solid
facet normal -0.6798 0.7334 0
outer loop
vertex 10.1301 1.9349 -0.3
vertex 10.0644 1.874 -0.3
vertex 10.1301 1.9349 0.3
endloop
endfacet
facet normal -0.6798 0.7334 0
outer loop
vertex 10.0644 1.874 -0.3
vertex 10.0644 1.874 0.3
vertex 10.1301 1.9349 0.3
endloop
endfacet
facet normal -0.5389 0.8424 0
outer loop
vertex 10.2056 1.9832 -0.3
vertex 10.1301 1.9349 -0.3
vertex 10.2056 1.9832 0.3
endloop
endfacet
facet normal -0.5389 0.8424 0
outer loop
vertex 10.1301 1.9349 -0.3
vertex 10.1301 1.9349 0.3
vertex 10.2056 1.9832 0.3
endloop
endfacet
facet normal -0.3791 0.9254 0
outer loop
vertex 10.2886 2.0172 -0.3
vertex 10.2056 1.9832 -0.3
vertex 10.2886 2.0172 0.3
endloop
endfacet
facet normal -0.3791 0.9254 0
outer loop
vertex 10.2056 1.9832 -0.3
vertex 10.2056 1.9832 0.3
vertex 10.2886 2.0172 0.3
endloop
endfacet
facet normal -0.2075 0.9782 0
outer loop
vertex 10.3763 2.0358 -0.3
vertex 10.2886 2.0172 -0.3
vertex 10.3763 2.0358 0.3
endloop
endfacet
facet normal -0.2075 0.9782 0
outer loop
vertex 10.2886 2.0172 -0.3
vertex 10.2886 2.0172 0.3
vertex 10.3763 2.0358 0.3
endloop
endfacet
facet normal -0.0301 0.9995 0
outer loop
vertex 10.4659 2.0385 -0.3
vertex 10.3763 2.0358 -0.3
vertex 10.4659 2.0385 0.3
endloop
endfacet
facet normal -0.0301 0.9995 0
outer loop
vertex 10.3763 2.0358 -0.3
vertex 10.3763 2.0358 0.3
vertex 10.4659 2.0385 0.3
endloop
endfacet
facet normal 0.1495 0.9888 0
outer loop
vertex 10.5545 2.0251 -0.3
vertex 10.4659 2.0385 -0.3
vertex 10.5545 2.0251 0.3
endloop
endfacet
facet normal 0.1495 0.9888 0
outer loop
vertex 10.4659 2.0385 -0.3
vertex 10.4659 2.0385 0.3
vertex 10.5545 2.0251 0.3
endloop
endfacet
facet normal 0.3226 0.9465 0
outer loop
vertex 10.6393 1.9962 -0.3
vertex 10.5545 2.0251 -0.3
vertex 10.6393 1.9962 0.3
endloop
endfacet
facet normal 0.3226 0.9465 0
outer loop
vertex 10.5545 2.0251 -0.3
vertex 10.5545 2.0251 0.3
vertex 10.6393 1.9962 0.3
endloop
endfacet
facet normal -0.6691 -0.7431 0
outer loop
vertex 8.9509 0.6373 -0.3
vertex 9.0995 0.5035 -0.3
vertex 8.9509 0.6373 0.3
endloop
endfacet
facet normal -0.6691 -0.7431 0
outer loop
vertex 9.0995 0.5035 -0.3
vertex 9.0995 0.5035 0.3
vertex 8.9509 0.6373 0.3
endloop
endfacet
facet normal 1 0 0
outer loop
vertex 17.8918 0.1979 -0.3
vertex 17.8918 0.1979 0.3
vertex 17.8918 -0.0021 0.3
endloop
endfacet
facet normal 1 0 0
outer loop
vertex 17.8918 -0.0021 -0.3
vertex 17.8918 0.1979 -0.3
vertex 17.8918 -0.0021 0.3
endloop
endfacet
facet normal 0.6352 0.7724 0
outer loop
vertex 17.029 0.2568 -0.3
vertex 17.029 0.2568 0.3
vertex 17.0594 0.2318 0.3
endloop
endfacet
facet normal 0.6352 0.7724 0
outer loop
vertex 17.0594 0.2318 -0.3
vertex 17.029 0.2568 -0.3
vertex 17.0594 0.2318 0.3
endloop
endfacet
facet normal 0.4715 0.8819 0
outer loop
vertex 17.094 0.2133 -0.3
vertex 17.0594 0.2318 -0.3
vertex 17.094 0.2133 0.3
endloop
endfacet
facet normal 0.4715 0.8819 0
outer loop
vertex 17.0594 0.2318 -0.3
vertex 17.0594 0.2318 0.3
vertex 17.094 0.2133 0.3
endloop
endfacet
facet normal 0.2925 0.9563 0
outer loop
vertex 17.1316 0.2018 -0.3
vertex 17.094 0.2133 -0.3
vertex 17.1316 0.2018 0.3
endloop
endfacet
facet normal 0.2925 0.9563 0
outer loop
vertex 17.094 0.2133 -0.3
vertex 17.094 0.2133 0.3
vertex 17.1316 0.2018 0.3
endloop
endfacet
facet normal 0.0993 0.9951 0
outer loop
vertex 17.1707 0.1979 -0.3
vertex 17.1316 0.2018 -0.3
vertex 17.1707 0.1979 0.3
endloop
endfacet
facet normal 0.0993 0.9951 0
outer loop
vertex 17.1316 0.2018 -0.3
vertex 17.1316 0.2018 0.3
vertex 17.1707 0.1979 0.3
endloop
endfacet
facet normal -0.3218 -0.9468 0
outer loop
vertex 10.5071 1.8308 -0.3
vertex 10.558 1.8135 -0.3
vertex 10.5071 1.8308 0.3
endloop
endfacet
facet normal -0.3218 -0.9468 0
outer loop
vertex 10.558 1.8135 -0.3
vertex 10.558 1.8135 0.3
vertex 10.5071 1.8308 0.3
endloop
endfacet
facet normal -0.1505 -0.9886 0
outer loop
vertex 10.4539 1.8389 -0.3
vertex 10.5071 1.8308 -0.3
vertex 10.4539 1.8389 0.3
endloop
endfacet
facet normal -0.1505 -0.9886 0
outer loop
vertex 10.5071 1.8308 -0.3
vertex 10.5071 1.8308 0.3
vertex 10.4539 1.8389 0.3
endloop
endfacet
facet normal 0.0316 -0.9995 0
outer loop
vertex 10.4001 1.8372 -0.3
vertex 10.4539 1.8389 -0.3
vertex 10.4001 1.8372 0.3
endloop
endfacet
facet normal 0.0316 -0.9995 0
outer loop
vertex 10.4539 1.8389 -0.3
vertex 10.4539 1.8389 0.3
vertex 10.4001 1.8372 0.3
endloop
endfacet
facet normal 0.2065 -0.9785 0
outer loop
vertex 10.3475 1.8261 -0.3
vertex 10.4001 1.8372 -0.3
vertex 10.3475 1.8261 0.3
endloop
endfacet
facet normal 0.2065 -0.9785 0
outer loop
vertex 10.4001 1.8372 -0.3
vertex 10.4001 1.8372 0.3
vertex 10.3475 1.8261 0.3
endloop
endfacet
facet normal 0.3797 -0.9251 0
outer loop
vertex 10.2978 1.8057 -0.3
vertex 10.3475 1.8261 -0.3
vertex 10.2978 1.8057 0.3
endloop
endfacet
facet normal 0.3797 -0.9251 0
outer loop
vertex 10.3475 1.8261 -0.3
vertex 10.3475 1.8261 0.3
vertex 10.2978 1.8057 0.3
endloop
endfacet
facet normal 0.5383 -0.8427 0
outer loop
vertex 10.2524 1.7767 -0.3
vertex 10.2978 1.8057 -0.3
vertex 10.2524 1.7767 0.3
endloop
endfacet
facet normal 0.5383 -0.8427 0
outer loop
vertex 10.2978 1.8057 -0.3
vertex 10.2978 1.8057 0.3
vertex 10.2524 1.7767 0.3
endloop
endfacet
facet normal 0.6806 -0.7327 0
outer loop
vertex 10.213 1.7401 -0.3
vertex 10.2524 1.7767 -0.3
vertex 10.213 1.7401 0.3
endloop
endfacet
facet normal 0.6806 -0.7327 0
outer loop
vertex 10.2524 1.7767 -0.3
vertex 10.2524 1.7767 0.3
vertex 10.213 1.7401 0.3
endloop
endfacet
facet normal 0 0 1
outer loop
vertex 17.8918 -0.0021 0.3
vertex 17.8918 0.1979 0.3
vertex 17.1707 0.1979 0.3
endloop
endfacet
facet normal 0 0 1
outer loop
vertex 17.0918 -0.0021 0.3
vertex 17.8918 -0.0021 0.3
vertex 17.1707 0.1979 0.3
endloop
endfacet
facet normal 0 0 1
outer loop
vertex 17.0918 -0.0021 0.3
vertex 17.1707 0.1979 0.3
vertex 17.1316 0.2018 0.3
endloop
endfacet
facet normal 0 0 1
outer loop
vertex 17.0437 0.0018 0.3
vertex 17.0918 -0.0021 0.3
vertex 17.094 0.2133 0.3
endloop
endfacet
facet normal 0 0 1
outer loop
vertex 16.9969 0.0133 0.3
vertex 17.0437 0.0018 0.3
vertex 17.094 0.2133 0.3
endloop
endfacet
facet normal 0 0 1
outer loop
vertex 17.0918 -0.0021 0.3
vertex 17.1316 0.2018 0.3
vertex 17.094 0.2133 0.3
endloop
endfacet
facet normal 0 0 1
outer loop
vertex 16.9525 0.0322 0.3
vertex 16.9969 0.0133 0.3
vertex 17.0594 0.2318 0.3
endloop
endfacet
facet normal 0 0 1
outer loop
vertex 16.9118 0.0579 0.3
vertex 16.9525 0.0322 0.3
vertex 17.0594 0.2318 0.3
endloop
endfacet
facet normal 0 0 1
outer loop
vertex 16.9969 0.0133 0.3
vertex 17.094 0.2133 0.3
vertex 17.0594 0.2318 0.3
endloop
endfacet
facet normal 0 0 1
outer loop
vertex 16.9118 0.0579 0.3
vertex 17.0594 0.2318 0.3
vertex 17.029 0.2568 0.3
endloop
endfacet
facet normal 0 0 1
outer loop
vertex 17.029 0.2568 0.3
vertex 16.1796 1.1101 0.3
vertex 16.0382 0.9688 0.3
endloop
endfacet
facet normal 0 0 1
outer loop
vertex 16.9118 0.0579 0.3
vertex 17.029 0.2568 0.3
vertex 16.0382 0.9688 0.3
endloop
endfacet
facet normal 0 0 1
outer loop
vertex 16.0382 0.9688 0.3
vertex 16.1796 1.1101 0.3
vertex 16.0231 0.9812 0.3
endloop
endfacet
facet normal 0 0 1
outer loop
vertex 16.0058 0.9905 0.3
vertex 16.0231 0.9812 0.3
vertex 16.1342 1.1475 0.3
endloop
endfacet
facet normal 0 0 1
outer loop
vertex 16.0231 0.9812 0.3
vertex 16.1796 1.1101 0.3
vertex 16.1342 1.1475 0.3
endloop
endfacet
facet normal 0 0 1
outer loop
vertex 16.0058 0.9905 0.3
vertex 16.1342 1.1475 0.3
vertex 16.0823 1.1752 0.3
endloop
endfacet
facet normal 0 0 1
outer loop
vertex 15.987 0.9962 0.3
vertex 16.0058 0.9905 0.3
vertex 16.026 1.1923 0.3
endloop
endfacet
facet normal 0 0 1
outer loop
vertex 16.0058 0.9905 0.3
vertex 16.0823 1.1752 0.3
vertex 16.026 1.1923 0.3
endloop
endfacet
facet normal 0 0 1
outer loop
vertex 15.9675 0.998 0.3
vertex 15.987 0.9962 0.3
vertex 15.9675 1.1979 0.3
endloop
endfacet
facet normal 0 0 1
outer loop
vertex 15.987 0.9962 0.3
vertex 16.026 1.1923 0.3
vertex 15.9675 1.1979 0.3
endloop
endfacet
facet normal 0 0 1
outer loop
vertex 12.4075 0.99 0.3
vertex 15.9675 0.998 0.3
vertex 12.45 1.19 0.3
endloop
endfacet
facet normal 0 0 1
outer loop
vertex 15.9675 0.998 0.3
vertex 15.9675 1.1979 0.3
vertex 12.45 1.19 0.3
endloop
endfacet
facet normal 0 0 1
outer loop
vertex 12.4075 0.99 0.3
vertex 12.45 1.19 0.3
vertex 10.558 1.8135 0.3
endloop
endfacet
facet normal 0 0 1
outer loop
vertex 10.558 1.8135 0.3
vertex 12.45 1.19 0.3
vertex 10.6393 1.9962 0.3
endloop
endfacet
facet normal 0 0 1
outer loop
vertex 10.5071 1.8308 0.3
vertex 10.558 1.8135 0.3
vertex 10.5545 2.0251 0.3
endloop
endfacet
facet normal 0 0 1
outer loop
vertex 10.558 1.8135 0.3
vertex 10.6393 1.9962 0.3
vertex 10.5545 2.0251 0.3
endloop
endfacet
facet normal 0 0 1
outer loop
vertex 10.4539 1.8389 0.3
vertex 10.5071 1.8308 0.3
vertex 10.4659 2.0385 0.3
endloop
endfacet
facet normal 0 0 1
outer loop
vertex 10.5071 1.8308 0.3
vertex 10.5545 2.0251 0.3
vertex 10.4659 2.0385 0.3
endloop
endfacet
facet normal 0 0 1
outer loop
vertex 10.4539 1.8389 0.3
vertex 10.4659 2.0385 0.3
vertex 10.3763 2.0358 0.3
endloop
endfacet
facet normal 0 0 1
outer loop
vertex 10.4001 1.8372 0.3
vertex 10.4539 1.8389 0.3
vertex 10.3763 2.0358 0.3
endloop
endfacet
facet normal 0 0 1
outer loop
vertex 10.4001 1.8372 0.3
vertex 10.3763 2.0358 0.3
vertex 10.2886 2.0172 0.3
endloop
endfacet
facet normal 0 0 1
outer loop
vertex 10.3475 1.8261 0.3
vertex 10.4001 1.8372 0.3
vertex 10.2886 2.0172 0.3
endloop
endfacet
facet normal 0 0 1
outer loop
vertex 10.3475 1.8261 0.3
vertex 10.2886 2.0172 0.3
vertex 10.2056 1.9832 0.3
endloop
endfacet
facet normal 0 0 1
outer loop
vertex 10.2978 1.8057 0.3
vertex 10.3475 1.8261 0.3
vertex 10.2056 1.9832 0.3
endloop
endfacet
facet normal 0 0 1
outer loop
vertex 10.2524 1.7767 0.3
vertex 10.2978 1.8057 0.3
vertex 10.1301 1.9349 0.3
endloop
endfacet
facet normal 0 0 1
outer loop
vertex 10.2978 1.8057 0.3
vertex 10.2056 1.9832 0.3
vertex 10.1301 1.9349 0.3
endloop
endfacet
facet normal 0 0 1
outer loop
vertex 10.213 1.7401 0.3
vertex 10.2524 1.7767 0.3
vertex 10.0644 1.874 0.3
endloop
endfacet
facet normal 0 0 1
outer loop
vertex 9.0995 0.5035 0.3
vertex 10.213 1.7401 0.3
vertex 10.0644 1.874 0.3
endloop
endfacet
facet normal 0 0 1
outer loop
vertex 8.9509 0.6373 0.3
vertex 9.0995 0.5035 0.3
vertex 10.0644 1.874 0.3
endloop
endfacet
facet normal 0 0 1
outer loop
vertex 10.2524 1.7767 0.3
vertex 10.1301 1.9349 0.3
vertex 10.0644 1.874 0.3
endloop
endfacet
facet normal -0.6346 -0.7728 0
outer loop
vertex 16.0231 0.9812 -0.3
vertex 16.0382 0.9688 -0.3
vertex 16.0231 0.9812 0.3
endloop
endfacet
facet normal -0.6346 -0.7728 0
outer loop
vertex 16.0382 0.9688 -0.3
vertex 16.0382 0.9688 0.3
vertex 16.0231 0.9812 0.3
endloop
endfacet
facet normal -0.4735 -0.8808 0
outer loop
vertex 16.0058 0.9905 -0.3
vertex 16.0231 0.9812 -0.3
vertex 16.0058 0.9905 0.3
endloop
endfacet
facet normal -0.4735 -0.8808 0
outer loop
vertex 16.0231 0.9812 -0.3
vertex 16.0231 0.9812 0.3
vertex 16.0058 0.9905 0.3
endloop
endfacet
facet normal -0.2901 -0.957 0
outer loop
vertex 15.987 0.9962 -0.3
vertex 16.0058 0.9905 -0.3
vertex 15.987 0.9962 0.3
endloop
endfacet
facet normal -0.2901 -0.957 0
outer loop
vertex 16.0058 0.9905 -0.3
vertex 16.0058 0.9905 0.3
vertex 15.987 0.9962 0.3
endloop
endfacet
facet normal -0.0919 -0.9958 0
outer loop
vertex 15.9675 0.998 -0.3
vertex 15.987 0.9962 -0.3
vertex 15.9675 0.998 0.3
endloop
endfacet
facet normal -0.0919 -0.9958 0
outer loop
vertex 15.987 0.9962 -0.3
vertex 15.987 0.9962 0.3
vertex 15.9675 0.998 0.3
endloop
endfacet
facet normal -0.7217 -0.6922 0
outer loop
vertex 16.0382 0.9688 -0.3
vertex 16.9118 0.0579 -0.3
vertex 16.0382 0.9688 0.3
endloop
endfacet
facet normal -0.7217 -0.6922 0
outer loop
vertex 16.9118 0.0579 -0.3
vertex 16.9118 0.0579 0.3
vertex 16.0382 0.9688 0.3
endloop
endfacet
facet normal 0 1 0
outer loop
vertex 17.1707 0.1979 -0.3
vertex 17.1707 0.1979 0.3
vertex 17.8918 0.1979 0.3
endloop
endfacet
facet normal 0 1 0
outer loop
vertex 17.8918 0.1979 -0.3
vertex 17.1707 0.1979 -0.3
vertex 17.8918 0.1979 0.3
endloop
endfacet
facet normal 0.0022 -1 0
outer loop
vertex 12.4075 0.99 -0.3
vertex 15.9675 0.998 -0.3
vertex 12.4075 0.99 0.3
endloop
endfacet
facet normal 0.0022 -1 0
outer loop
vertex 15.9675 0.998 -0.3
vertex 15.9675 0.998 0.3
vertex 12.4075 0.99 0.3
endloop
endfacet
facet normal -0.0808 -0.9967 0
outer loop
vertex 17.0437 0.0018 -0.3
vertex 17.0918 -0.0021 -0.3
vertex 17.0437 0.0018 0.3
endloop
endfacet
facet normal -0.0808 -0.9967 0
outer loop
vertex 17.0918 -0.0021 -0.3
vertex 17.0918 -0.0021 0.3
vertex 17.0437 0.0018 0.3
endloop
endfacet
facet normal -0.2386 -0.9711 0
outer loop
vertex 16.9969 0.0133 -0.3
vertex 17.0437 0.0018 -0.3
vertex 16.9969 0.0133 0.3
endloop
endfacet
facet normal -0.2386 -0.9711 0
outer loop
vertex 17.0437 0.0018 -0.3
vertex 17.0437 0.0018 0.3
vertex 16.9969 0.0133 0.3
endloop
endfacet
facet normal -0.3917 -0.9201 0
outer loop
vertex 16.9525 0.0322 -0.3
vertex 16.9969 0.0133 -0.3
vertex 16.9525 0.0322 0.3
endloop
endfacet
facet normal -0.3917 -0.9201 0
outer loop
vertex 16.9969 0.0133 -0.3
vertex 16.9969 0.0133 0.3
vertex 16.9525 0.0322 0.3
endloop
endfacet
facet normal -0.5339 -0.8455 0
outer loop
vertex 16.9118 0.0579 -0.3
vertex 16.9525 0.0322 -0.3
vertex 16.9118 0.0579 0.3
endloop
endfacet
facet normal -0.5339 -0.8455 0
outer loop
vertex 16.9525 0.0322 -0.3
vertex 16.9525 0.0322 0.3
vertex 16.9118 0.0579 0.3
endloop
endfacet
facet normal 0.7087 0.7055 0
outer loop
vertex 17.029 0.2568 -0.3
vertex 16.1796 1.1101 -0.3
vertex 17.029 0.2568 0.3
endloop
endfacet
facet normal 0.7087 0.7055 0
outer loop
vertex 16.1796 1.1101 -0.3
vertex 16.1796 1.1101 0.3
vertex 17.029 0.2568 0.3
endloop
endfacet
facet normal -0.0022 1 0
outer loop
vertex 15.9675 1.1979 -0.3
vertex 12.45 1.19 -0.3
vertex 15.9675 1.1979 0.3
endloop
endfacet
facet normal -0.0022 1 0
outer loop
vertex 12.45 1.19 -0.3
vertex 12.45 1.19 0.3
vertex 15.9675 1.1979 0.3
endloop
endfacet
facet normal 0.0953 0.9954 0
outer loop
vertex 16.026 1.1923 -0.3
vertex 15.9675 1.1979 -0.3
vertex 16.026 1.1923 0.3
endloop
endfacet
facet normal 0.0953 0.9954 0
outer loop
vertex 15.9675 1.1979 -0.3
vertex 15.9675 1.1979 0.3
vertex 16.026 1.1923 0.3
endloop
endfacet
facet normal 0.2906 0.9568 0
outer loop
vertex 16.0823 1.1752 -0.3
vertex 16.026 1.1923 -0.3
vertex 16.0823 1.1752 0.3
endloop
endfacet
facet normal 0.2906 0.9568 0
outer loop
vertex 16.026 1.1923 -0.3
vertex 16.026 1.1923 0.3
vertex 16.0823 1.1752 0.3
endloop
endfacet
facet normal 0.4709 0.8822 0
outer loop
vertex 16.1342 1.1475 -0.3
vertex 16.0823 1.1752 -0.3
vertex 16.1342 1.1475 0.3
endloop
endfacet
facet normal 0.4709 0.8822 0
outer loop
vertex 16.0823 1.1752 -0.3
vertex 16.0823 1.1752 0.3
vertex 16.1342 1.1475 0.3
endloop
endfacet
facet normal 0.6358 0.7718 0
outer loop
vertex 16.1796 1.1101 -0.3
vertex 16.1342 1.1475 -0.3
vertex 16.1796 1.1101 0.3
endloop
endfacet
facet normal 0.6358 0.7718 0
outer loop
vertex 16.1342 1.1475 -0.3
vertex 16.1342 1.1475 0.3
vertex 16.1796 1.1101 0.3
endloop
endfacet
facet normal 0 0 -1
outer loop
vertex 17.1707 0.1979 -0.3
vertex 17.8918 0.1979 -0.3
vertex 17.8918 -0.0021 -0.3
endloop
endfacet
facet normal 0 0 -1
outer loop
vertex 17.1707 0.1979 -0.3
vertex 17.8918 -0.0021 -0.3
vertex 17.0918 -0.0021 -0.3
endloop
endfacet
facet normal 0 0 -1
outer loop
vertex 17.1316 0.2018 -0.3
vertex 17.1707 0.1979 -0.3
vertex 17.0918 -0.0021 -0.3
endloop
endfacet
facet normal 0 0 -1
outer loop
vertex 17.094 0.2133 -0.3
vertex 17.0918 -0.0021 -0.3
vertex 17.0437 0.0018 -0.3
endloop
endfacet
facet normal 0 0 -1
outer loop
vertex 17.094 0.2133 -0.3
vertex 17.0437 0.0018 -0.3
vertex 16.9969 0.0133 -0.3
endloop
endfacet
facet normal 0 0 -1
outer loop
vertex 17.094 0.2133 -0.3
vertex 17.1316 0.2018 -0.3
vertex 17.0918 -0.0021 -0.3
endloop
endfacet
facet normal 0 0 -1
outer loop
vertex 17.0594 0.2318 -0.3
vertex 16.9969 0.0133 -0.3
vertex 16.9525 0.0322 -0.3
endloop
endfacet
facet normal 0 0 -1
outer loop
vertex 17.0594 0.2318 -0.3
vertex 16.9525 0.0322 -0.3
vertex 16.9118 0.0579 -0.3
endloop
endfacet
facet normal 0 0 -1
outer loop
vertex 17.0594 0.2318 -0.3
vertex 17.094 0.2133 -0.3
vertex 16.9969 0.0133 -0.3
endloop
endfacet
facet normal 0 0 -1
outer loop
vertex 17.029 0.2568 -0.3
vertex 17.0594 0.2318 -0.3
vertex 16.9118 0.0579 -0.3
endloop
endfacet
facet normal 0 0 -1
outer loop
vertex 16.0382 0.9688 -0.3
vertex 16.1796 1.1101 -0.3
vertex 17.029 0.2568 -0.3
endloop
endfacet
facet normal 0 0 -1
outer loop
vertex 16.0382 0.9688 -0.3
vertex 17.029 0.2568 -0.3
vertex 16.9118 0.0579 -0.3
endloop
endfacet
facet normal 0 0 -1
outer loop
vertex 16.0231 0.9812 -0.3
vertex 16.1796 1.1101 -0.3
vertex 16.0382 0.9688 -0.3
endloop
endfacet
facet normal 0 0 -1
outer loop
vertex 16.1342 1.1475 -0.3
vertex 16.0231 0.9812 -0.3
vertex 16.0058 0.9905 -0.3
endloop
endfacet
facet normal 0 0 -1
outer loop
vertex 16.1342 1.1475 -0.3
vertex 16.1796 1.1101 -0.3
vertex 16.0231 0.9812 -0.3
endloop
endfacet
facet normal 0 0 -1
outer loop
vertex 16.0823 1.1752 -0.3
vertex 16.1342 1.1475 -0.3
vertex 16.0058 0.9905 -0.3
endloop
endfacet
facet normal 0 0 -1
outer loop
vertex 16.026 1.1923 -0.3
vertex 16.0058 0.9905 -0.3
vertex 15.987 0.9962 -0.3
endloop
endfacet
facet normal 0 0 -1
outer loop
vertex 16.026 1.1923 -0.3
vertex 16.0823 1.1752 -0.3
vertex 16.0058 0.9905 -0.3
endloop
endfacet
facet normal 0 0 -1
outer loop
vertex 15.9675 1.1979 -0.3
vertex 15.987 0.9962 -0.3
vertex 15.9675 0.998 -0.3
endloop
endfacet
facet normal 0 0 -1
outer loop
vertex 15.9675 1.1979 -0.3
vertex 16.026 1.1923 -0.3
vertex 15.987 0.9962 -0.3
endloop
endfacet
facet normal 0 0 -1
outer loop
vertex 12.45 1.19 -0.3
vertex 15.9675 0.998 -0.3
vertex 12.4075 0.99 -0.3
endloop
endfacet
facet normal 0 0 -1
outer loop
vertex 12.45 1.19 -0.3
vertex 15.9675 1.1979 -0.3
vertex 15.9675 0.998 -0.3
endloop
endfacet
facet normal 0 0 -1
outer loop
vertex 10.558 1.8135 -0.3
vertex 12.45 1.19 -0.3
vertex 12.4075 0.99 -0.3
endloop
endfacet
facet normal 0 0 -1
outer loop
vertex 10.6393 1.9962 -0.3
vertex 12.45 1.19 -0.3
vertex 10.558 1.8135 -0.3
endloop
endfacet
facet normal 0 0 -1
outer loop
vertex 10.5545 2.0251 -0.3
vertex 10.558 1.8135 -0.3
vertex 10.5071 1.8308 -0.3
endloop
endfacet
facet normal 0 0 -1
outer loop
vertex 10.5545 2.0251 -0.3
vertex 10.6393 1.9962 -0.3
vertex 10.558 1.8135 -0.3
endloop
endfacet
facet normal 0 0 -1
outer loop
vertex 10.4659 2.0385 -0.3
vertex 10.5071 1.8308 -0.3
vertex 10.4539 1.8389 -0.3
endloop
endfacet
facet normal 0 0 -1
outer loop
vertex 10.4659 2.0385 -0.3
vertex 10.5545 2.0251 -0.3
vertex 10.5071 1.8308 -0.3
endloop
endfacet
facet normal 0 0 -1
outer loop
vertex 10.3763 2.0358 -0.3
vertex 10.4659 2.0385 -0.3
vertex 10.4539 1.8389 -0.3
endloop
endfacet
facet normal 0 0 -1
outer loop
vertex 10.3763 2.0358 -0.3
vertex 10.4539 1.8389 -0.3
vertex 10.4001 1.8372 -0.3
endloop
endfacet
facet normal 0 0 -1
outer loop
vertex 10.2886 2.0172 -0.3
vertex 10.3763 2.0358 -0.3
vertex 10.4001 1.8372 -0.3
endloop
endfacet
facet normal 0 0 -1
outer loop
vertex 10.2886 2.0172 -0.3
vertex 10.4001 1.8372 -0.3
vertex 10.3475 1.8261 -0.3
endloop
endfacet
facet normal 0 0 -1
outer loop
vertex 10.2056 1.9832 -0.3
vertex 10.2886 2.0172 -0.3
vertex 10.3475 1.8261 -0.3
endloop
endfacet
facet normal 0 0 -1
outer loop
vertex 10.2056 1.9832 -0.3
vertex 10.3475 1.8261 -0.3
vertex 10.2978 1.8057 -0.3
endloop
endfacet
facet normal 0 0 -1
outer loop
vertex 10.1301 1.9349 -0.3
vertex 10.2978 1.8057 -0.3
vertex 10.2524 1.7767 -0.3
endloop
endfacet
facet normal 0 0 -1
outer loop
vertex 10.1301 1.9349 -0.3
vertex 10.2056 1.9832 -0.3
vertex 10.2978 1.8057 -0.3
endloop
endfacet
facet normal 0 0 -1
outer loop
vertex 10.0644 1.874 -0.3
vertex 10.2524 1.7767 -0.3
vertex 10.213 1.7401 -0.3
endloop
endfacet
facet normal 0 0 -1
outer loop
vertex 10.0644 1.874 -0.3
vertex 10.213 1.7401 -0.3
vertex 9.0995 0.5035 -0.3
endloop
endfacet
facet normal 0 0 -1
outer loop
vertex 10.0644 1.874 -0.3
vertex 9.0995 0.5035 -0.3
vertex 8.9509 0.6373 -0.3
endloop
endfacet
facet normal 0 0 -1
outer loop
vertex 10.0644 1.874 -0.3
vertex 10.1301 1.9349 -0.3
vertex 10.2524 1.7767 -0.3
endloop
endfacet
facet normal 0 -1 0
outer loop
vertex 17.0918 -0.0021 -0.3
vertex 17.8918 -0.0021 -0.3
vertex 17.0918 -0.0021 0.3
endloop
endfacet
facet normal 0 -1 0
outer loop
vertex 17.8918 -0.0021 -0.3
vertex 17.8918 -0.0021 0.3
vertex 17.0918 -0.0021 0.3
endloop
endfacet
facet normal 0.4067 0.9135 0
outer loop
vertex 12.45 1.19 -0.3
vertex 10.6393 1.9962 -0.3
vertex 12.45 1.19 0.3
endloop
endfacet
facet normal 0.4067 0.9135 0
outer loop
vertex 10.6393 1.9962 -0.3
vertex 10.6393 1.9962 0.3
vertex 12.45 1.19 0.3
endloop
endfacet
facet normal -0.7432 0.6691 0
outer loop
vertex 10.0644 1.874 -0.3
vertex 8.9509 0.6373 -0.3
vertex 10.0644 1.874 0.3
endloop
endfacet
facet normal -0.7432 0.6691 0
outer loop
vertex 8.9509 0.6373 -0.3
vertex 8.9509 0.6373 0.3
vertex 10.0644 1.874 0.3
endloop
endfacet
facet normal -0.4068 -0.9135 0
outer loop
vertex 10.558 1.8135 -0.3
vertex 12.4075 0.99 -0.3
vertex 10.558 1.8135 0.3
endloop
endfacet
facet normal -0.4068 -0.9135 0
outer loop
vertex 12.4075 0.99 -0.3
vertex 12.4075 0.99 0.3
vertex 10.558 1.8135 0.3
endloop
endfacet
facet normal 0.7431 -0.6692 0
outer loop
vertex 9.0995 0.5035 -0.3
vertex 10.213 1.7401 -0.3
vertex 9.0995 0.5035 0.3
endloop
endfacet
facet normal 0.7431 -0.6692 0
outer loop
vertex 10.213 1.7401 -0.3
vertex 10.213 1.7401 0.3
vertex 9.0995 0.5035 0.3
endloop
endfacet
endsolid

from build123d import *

# Parameters (mm, degrees)
RESSALTO_EXTRUS_O1_DEPTH = 0.3


with BuildPart() as part:
    # Esboço1 → Ressalto-extrusão1 (new body, symmetric)
    with BuildSketch(Plane.XY):
        with BuildLine():
            Line((17.891752756, 0.197947805), (17.891752756, -0.002052195))
            Line((17.891752756, -0.002052195), (17.091752756, -0.002052195))
            ThreePointArc((17.091752756, -0.002052195), (16.996884427, 0.013342816), (16.911752756, 0.057947805))
            Line((16.911752756, 0.057947805), (16.038199366, 0.968756691))
            ThreePointArc((16.038199366, 0.968756691), (16.005773821, 0.990473944), (15.967488688, 0.99804386))
            Line((15.967488688, 0.99804386), (12.407488688, 0.99))
            Line((12.407488688, 0.99), (10.557971552, 1.813458083))
            ThreePointArc((10.557971552, 1.813458083), (10.373577052, 1.832838725), (10.213007112, 1.740133627))
            Line((10.213007112, 1.740133627), (9.099531826, 0.503494039))
            Line((9.099531826, 0.503494039), (8.95090286, 0.637320161))
            Line((8.95090286, 0.637320161), (10.064378147, 1.873959748))
            ThreePointArc((10.064378147, 1.873959748), (10.331994714, 2.028468246), (10.639318881, 1.996167174))
            Line((10.639318881, 1.996167174), (12.45, 1.19))
            Line((12.45, 1.19), (15.967488688, 1.197947805))
            ThreePointArc((15.967488688, 1.197947805), (16.082345327, 1.175236263), (16.179620722, 1.11007984))
            Line((16.179620722, 1.11007984), (17.029007121, 0.256846352))
            ThreePointArc((17.029007121, 0.256846352), (17.094002269, 0.213258484), (17.170747658, 0.197947805))
            Line((17.170747658, 0.197947805), (17.891752756, 0.197947805))
        make_face()
    extrude(amount=RESSALTO_EXTRUS_O1_DEPTH, both=True)


solid = part.part
